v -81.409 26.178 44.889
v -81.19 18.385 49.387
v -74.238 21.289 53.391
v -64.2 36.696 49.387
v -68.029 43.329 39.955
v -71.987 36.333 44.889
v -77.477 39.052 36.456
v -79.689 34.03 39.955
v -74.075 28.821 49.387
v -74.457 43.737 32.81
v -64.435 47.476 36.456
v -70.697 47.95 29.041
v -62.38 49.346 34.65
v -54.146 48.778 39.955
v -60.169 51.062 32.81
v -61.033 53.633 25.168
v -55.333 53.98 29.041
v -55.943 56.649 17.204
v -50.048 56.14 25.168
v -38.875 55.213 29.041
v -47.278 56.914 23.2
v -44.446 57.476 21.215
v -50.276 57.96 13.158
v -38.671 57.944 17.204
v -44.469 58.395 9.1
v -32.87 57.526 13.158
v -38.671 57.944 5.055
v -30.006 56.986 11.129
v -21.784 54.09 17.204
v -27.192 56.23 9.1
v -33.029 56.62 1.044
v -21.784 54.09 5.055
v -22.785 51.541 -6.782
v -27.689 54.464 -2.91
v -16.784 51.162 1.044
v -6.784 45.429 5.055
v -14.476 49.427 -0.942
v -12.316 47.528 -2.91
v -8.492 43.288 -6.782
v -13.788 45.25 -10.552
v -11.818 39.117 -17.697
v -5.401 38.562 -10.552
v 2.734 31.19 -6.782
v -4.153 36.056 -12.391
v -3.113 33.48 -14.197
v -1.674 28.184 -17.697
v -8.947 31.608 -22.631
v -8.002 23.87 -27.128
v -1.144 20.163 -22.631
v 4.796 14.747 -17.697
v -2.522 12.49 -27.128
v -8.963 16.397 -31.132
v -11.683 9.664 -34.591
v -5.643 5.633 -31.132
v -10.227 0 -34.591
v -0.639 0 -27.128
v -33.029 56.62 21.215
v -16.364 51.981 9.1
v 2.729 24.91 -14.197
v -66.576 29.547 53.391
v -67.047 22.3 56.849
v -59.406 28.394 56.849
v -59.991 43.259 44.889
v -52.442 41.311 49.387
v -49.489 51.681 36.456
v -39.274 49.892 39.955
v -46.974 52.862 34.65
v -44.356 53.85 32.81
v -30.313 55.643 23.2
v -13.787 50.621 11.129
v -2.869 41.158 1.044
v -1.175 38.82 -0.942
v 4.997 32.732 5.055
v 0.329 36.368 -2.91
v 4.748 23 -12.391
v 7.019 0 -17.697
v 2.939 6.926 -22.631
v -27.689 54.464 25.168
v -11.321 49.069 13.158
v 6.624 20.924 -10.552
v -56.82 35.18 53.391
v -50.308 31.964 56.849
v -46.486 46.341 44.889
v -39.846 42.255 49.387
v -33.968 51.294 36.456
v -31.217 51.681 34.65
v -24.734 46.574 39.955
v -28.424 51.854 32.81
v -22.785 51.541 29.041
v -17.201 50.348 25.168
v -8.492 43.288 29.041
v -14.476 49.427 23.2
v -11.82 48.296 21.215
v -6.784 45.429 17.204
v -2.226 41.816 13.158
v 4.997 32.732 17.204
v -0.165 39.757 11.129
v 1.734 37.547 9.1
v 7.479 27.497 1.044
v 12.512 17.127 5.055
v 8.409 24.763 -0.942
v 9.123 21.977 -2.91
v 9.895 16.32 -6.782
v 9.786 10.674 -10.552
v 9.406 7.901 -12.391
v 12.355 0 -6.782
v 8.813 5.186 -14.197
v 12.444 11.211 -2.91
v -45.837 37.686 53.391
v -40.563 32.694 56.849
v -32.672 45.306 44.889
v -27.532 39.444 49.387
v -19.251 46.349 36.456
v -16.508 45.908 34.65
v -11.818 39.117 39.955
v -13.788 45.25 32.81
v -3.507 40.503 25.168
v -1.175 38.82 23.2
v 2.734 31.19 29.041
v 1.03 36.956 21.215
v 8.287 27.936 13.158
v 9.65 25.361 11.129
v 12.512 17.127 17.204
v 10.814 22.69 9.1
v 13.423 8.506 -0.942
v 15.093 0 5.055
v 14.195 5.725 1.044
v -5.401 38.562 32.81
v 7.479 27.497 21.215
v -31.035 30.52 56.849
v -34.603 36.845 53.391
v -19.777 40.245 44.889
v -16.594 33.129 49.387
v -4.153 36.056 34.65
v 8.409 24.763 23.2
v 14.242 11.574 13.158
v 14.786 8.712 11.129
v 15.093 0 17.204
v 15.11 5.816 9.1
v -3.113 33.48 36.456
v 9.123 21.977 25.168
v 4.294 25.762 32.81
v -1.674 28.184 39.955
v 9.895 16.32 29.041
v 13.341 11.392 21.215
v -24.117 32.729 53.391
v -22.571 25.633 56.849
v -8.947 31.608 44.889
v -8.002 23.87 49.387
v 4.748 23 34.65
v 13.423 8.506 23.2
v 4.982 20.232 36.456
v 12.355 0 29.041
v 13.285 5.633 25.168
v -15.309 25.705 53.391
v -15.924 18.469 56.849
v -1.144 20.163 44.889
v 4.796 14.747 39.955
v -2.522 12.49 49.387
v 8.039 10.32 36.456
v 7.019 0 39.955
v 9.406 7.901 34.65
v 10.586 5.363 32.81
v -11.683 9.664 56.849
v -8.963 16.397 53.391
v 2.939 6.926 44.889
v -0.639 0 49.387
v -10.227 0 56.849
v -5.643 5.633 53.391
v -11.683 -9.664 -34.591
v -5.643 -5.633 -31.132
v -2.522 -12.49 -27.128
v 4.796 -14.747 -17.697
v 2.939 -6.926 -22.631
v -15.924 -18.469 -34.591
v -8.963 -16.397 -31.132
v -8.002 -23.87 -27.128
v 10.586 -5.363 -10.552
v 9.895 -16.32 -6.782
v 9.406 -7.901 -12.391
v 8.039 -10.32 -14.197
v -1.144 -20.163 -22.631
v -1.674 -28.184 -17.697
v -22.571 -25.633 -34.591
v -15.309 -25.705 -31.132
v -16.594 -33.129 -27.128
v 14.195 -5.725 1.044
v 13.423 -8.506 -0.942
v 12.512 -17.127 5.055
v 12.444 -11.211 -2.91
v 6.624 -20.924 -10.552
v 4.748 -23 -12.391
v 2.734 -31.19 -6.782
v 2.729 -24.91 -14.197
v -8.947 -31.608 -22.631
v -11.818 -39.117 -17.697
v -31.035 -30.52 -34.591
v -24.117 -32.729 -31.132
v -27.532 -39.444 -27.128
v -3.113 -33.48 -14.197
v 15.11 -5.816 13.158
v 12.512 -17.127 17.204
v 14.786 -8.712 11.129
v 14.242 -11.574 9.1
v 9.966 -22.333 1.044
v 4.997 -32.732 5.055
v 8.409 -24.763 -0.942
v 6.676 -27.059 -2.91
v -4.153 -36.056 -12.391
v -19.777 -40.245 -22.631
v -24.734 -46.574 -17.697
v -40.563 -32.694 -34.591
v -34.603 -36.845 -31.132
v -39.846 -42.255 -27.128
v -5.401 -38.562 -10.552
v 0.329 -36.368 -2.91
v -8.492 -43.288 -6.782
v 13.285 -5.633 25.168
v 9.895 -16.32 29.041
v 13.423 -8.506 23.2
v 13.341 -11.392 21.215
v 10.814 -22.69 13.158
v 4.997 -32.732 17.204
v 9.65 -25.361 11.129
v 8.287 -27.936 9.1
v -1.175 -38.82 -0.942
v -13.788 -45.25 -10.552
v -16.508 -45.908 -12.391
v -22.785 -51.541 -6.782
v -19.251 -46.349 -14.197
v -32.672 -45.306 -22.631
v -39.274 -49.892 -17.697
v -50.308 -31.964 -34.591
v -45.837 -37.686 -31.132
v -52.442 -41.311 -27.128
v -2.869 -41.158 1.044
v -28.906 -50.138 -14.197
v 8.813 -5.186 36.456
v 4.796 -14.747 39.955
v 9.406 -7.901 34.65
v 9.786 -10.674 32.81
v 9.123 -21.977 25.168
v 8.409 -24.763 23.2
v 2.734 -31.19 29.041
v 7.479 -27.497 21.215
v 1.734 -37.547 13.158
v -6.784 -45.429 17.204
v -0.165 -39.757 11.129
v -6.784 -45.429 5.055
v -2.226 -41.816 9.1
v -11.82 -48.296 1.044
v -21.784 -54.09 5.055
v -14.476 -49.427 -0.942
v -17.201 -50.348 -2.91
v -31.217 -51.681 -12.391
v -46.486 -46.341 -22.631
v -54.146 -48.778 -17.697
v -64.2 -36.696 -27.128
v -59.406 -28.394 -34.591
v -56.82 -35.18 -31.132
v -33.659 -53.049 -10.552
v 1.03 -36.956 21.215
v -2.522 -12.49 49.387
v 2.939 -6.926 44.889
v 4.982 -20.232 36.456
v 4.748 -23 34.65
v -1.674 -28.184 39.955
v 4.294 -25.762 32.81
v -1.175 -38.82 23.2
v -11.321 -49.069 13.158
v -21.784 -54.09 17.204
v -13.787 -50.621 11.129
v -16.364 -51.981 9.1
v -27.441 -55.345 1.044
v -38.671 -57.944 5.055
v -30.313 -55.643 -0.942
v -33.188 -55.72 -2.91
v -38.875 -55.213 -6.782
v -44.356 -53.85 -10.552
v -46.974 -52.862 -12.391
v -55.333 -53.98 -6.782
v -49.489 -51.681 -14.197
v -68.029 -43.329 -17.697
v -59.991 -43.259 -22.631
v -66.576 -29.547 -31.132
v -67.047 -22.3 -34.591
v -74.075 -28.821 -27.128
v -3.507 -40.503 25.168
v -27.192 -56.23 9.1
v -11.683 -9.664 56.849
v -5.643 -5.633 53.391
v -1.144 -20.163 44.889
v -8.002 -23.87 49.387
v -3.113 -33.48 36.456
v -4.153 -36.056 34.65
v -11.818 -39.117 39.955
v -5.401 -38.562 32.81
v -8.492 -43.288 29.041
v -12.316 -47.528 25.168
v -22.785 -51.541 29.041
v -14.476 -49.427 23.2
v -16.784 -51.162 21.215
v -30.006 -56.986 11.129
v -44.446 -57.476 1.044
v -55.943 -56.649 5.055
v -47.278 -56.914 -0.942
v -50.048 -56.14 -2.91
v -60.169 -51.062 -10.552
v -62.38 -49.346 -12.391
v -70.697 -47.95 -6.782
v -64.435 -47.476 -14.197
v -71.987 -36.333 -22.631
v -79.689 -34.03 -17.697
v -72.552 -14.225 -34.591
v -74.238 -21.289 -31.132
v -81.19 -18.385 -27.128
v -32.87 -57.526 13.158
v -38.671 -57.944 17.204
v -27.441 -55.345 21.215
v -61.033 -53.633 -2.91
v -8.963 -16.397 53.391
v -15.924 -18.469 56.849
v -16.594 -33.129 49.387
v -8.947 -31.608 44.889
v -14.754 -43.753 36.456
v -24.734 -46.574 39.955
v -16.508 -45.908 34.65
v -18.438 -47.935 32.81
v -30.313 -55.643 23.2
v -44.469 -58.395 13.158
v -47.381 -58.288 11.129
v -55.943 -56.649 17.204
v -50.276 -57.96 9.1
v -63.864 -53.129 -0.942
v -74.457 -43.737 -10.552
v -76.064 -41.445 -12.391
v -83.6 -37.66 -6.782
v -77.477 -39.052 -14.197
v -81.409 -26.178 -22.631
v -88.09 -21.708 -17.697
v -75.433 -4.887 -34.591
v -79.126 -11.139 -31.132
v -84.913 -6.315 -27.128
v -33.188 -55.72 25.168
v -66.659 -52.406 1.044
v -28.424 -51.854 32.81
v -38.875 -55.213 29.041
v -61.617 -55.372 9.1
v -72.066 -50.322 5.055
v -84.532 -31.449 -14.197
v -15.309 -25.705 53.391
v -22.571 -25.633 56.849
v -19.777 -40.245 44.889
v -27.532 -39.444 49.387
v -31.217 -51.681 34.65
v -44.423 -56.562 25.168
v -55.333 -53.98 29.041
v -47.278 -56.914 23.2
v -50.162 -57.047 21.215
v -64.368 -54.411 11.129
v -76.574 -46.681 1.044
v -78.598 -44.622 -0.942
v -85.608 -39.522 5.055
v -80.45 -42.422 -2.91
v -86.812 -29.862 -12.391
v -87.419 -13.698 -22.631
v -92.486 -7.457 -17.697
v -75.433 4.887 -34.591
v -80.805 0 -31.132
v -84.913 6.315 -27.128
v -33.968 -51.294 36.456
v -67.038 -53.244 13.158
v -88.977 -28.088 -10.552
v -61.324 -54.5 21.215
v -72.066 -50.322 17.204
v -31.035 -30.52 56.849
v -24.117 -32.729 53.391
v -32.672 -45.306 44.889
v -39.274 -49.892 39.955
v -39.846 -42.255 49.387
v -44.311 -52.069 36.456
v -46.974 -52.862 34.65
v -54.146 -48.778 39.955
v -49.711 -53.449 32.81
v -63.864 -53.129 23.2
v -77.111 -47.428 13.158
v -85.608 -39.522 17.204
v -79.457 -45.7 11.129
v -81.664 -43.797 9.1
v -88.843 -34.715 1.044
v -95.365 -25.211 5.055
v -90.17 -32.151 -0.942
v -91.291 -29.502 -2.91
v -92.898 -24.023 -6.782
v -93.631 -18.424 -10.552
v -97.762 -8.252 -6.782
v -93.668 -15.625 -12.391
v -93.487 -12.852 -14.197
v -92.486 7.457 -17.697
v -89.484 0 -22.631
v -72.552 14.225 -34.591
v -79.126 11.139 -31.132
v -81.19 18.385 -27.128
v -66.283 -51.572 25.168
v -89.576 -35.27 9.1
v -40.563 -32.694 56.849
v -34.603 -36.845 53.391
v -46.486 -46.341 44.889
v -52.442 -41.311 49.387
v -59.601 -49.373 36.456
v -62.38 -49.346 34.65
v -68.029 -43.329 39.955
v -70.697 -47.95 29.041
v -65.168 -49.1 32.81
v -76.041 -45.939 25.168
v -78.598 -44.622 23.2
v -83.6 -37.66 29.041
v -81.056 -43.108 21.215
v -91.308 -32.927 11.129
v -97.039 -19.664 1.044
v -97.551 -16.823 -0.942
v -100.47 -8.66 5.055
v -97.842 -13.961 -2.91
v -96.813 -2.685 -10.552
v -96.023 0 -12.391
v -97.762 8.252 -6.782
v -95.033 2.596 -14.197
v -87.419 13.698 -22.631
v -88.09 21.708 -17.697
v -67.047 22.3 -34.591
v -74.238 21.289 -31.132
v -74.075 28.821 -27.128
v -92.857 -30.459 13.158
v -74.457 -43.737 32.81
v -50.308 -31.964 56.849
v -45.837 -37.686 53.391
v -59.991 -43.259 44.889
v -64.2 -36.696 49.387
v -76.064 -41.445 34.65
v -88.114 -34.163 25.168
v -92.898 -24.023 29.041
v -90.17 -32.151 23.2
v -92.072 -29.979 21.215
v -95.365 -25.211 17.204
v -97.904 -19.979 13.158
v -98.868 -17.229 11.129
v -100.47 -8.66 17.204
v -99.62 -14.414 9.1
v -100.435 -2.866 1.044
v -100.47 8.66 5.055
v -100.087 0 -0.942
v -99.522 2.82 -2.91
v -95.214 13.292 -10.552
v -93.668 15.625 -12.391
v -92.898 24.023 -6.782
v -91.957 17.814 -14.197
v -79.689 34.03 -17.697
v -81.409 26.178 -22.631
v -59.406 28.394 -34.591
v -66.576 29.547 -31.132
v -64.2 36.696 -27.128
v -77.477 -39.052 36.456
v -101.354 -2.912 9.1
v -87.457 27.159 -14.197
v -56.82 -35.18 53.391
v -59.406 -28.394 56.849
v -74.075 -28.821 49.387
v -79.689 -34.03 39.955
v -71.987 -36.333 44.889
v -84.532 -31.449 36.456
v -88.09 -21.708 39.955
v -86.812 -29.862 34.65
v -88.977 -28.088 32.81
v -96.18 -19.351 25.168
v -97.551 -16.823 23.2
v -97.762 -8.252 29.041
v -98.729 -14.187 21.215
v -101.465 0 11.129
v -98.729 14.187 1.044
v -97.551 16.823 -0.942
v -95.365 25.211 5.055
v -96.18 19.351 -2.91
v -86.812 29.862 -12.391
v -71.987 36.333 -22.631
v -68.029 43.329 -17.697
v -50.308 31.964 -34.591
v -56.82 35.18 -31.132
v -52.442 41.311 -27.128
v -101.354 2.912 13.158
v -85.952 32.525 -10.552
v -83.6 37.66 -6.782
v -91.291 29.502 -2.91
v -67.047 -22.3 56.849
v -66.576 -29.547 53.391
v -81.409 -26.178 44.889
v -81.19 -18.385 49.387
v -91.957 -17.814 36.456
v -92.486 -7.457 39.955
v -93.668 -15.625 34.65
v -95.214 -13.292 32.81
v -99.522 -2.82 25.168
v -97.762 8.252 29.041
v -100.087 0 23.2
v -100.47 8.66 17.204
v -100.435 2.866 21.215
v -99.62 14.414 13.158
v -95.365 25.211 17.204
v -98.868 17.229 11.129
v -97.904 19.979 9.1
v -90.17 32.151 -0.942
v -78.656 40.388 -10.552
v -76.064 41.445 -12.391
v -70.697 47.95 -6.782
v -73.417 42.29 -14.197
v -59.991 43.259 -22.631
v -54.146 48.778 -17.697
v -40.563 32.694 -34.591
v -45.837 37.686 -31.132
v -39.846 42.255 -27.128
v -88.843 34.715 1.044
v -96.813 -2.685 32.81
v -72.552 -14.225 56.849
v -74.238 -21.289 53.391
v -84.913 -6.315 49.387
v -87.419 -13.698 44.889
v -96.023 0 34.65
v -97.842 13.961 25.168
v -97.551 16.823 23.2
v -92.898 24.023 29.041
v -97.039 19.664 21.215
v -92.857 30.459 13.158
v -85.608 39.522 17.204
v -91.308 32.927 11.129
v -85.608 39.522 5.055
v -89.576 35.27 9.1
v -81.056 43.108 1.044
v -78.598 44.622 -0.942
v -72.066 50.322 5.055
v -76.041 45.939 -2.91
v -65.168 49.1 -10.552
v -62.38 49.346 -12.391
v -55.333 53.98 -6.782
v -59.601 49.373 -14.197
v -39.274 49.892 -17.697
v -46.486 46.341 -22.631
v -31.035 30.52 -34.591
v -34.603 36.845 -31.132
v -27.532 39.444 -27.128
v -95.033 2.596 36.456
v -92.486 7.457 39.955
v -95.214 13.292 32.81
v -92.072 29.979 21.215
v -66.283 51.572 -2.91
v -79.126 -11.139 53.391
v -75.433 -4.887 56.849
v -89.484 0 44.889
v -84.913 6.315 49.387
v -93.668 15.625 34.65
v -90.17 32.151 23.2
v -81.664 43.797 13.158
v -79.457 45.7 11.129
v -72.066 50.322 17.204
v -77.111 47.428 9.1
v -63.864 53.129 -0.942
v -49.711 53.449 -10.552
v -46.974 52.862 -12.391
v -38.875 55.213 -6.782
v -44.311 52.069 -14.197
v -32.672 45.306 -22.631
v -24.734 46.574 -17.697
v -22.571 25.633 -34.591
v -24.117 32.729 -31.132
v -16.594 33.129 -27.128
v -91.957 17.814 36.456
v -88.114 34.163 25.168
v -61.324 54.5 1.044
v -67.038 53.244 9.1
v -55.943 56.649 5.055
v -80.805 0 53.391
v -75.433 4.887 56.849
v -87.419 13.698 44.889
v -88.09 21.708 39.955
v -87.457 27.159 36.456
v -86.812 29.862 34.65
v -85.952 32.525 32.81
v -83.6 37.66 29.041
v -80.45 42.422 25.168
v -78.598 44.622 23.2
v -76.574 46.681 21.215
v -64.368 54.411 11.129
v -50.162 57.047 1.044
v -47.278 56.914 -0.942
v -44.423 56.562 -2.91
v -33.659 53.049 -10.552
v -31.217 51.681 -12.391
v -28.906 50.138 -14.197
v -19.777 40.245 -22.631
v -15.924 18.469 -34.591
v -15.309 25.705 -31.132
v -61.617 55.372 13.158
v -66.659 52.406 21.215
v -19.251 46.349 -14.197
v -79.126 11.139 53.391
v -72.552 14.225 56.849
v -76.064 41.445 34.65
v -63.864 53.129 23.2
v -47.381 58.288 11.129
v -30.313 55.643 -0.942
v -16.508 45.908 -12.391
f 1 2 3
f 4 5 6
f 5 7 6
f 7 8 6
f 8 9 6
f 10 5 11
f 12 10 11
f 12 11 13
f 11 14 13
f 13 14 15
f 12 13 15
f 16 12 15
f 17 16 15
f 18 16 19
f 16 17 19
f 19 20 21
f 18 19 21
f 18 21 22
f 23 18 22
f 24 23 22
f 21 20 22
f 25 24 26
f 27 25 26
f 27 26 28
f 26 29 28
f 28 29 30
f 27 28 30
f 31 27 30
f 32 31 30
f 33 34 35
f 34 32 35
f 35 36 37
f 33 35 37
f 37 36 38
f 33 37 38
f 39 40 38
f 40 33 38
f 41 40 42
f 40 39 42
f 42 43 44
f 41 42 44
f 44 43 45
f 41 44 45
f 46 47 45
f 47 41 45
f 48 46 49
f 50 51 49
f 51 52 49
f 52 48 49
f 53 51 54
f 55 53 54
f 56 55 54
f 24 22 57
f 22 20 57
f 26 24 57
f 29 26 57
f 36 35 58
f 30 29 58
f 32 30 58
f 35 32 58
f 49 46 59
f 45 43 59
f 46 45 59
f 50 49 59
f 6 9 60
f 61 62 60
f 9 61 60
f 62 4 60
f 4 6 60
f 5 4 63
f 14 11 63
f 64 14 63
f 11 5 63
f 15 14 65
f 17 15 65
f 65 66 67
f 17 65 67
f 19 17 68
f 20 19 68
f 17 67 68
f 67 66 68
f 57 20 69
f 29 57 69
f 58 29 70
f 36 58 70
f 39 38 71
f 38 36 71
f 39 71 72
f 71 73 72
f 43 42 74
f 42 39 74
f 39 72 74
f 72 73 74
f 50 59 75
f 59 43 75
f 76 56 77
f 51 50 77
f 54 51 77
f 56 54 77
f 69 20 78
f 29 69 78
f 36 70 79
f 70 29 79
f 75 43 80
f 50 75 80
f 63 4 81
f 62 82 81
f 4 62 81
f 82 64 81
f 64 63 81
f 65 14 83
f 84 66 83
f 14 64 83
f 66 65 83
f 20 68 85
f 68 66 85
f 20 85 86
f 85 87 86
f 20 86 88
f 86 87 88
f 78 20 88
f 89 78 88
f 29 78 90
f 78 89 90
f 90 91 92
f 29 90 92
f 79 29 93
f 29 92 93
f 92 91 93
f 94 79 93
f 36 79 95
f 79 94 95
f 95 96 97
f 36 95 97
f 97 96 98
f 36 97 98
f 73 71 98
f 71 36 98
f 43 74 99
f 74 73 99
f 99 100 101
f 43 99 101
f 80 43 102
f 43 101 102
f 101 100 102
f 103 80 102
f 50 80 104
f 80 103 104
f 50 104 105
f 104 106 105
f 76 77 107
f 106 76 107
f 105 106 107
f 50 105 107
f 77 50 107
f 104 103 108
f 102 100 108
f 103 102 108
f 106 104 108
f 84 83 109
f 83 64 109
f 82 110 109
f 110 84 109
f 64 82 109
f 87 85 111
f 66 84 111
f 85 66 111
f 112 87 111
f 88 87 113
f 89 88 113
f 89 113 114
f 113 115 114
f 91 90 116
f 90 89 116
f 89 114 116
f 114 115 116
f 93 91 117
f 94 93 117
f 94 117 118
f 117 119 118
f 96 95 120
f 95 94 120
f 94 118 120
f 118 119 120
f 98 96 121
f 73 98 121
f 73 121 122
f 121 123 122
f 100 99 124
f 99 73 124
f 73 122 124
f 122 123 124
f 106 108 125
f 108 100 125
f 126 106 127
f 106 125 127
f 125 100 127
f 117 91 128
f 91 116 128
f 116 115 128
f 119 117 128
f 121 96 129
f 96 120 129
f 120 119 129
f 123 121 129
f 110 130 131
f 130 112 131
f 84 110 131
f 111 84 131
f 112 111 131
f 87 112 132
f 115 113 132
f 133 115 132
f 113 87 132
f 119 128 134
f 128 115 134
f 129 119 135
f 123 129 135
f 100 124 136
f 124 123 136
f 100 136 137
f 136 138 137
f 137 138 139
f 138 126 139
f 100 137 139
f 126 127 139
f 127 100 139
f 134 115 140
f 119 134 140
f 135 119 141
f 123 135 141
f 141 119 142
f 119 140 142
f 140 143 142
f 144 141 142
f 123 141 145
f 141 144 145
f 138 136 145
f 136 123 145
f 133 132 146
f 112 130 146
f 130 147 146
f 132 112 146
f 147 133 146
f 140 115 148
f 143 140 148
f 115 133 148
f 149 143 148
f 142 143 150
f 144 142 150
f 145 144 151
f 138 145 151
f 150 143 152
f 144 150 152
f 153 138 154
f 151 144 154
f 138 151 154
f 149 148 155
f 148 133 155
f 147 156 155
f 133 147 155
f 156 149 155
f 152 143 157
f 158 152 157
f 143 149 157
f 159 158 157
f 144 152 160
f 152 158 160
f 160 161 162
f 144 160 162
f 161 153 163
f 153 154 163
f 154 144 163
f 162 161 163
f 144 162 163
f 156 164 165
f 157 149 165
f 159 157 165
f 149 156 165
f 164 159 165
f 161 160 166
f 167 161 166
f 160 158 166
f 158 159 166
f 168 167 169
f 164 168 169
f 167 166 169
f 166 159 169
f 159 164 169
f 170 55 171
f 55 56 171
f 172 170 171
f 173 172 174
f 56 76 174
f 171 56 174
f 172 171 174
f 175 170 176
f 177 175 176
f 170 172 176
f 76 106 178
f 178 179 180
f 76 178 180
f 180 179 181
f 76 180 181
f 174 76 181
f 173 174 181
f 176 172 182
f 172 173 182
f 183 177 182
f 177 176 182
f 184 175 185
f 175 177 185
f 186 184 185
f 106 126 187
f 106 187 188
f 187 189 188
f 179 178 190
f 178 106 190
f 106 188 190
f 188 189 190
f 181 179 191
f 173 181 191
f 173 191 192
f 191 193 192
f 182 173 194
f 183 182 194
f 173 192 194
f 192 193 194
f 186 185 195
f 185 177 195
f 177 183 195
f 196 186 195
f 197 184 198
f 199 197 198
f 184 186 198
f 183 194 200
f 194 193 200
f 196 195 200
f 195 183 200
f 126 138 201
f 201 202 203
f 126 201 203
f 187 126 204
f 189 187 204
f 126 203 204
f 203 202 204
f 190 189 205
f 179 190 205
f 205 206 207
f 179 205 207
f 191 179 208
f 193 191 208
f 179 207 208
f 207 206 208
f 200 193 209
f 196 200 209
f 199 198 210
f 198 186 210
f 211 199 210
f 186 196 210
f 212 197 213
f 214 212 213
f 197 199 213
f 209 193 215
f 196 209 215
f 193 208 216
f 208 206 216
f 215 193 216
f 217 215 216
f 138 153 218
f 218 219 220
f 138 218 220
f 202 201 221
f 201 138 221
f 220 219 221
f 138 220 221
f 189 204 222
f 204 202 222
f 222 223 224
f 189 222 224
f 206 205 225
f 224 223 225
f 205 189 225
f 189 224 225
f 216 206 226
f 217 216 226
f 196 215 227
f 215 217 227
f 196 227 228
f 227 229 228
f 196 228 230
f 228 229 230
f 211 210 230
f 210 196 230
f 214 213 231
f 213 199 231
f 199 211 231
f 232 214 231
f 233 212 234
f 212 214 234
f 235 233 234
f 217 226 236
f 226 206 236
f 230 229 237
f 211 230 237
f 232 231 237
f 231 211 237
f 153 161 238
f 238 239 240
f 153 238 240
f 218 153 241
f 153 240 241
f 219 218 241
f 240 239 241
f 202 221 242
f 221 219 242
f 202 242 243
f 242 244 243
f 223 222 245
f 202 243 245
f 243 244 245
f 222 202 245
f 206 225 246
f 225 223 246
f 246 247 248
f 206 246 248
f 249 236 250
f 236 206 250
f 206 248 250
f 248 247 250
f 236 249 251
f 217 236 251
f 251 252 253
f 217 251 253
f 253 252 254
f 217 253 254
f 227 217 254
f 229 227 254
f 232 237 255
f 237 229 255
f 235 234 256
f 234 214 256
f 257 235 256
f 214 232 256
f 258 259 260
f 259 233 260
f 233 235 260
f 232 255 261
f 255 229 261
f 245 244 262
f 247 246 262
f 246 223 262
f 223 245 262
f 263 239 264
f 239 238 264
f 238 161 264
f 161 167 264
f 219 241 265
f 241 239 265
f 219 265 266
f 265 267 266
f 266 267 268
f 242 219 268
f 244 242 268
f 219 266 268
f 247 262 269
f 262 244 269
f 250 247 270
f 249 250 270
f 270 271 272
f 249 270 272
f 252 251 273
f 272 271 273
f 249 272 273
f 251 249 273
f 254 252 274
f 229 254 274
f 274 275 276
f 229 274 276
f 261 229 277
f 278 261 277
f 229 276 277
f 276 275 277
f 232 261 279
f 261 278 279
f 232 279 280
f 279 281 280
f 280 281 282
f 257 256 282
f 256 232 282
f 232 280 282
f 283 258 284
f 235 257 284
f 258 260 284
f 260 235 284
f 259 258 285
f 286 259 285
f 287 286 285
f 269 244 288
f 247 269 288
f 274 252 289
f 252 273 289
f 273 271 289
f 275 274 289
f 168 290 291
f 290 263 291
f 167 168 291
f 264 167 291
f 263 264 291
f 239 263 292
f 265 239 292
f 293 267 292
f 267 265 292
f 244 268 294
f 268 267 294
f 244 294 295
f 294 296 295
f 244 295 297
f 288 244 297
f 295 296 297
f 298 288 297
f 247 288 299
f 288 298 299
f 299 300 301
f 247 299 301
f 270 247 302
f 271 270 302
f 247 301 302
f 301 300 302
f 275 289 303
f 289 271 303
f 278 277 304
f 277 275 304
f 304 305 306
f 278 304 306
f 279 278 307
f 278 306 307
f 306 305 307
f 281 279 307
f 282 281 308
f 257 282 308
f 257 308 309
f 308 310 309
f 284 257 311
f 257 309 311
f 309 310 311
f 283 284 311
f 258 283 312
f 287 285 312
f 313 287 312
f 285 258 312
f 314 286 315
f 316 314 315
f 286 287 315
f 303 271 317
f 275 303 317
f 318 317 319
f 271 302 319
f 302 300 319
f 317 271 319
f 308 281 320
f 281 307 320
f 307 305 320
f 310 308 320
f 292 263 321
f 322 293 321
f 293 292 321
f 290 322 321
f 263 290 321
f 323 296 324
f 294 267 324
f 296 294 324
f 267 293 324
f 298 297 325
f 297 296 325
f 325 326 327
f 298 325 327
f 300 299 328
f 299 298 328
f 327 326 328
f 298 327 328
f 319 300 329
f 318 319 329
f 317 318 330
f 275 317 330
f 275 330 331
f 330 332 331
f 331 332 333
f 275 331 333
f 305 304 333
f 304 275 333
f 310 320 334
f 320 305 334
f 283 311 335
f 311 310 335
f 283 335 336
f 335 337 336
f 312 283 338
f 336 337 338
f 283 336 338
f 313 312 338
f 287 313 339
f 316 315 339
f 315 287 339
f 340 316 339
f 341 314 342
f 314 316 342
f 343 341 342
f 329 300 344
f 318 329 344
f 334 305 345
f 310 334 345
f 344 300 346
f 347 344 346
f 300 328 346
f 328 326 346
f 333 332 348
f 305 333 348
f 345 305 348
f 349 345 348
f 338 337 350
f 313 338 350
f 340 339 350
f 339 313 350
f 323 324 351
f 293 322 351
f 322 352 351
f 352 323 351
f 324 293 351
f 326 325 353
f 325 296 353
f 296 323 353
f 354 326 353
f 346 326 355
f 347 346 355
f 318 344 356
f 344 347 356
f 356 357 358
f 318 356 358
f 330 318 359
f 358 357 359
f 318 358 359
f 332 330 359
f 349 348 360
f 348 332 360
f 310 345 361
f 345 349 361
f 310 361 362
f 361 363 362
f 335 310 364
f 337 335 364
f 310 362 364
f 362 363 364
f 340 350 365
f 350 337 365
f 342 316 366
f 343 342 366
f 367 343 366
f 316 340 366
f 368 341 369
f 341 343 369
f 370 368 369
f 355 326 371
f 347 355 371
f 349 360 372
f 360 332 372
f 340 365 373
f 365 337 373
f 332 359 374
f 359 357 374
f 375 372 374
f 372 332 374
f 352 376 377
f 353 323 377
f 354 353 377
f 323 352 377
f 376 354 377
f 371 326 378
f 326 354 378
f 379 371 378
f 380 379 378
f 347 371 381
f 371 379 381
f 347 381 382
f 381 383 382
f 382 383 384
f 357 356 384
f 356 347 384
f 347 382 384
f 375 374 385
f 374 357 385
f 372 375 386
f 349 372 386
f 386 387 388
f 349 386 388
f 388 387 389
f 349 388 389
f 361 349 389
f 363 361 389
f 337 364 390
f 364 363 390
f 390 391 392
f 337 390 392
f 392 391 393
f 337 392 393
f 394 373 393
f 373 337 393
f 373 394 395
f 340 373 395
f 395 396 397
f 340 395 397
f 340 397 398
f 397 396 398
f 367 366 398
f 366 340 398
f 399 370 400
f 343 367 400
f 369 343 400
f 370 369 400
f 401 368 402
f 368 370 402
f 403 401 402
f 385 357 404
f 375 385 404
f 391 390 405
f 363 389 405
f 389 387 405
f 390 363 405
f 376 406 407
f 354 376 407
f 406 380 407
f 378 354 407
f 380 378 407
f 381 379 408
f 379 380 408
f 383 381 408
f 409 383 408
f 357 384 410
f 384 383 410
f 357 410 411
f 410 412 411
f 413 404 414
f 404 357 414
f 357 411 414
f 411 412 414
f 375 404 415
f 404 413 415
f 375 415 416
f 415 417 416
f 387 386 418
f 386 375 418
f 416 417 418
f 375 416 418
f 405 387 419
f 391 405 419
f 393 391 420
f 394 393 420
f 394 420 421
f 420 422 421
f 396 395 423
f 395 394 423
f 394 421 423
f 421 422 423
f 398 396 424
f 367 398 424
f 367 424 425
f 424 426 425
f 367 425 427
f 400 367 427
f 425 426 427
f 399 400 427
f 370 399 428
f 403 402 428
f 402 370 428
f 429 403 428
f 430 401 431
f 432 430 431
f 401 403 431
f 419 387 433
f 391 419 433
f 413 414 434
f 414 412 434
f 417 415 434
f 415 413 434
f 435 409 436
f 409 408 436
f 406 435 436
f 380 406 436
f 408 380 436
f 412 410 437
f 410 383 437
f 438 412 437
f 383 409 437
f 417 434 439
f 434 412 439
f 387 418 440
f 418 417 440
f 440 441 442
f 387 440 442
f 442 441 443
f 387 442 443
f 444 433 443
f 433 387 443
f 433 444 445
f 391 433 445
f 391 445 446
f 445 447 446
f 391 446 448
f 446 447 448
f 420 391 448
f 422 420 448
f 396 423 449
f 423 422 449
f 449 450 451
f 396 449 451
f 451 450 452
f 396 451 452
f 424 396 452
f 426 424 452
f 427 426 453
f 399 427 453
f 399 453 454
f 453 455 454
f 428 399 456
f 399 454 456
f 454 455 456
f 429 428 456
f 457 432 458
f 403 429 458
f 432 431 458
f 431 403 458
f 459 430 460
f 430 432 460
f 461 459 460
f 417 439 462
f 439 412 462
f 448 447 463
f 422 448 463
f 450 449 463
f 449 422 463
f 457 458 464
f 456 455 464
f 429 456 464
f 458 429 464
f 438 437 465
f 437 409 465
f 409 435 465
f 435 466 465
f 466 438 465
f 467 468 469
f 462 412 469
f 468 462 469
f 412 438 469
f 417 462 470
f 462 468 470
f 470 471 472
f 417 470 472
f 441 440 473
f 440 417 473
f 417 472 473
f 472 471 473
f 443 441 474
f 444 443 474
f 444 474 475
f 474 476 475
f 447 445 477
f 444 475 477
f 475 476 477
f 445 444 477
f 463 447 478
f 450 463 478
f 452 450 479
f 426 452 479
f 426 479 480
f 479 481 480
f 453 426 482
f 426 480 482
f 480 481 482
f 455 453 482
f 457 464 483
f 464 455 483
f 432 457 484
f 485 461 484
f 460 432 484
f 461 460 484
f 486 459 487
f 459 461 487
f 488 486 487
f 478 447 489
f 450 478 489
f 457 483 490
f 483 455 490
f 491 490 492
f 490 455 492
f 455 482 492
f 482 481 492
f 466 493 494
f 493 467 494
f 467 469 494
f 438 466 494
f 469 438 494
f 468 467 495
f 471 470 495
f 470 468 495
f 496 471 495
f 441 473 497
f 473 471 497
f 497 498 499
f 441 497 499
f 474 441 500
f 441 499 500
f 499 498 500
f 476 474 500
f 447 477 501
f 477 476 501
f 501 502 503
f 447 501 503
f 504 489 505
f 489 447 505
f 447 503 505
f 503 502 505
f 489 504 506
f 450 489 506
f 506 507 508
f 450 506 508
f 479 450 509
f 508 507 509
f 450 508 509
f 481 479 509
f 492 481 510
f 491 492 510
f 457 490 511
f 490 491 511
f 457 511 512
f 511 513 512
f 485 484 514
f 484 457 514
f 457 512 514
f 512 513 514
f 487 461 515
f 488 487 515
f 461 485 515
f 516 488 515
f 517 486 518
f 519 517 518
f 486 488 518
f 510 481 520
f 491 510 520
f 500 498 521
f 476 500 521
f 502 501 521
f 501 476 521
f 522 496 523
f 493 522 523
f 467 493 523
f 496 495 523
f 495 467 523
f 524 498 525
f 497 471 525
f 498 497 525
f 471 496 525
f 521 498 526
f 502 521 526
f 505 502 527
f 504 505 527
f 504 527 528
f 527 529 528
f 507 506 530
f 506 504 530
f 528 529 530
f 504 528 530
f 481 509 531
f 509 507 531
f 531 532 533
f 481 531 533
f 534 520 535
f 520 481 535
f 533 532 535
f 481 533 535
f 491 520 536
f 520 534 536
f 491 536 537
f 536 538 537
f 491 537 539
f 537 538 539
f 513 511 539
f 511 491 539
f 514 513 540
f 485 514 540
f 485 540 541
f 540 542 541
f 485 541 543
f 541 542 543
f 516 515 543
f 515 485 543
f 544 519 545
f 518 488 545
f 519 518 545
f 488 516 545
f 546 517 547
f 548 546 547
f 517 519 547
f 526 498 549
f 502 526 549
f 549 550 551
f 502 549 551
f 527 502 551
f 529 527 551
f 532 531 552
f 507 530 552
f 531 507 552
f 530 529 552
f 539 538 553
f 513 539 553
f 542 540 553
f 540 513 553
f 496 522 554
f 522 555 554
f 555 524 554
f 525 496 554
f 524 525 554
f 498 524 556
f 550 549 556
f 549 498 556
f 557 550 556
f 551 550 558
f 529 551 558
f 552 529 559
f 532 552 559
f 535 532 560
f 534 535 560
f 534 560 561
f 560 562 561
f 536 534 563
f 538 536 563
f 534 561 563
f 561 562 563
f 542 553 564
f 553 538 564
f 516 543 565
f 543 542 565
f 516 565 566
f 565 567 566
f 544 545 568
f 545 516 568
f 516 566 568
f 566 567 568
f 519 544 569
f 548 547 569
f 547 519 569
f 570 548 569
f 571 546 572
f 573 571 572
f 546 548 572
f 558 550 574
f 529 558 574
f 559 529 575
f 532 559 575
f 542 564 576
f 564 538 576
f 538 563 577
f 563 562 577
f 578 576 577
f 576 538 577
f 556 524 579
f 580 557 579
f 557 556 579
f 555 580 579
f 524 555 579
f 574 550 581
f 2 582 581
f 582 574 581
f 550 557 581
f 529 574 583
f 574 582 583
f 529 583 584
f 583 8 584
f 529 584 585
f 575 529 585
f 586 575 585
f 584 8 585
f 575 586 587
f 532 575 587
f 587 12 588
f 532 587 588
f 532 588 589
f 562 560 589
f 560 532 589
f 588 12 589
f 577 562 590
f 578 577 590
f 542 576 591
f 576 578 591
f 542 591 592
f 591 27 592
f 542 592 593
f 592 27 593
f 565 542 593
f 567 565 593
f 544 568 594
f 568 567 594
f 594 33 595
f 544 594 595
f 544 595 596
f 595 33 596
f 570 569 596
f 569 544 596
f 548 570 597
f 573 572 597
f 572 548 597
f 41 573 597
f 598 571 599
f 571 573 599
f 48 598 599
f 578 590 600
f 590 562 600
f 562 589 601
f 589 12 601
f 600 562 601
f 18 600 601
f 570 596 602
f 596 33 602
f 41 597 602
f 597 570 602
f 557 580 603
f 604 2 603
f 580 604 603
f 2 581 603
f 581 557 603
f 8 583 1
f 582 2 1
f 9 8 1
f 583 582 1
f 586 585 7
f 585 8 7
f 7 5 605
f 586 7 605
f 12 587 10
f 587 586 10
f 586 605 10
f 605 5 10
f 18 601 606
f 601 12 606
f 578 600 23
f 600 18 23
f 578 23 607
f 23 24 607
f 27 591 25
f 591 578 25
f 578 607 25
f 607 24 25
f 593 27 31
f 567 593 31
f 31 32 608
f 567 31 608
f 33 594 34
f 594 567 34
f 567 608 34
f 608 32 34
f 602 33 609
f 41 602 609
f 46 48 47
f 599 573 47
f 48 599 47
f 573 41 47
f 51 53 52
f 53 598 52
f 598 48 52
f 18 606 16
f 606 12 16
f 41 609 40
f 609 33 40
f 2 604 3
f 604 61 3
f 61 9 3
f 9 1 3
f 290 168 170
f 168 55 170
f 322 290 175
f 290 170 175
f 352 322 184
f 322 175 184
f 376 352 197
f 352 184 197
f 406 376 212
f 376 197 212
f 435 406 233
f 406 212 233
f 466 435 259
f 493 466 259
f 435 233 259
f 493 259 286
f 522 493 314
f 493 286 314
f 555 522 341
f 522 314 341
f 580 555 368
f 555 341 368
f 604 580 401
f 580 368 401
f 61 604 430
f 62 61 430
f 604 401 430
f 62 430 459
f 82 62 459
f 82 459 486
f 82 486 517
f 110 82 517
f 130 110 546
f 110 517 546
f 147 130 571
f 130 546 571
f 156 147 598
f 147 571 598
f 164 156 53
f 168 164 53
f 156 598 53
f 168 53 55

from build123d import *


with BuildPart() as f1:
    # F0 (on Top) → F1 (revolve)
    with BuildSketch(Plane.XY):
        with BuildLine():
            ThreePointArc((-13.5355256498, -35.7939489186), (33.9644506091, 10.226842016), (-13.5355256498, 56.2476329505))
            Line((-13.5355256498, 56.2476329505), (-13.5355256498, -35.7939489186))
        make_face()
    revolve(axis=Axis((-39.7042110562, 9.9260546267, 0), (0, -1, 0)))

    # F2: F1 across plane


with BuildPart() as f1_1:
    add(f1.part)
    add(f1.part.mirror(Plane.YZ))


with BuildPart() as f5:
    # F4 (on Front) → F5 (revolve)
    with BuildSketch(Plane.XZ):
        with BuildLine():
            ThreePointArc((-10.2268429473, -34.5907881856), (15.4390227312, 11.1292097718), (-10.2268429473, 56.8492077291))
            Line((-10.2268429473, 56.8492077291), (-10.2268429473, -34.5907881856))
        make_face()
    revolve(axis=Axis((-43.01289469, 0, 10.8284205198), (0, 0, -1)))

    # F6: F5 across plane


with BuildPart() as f5_1:
    add(f5.part)
    add(f5.part.mirror(Plane.XZ))

    # F7: F5 across plane


with BuildPart() as f5_2:
    add(f5_1.part)
    add(f5_1.part.mirror(Plane.XZ))


solid = f5_2.part
